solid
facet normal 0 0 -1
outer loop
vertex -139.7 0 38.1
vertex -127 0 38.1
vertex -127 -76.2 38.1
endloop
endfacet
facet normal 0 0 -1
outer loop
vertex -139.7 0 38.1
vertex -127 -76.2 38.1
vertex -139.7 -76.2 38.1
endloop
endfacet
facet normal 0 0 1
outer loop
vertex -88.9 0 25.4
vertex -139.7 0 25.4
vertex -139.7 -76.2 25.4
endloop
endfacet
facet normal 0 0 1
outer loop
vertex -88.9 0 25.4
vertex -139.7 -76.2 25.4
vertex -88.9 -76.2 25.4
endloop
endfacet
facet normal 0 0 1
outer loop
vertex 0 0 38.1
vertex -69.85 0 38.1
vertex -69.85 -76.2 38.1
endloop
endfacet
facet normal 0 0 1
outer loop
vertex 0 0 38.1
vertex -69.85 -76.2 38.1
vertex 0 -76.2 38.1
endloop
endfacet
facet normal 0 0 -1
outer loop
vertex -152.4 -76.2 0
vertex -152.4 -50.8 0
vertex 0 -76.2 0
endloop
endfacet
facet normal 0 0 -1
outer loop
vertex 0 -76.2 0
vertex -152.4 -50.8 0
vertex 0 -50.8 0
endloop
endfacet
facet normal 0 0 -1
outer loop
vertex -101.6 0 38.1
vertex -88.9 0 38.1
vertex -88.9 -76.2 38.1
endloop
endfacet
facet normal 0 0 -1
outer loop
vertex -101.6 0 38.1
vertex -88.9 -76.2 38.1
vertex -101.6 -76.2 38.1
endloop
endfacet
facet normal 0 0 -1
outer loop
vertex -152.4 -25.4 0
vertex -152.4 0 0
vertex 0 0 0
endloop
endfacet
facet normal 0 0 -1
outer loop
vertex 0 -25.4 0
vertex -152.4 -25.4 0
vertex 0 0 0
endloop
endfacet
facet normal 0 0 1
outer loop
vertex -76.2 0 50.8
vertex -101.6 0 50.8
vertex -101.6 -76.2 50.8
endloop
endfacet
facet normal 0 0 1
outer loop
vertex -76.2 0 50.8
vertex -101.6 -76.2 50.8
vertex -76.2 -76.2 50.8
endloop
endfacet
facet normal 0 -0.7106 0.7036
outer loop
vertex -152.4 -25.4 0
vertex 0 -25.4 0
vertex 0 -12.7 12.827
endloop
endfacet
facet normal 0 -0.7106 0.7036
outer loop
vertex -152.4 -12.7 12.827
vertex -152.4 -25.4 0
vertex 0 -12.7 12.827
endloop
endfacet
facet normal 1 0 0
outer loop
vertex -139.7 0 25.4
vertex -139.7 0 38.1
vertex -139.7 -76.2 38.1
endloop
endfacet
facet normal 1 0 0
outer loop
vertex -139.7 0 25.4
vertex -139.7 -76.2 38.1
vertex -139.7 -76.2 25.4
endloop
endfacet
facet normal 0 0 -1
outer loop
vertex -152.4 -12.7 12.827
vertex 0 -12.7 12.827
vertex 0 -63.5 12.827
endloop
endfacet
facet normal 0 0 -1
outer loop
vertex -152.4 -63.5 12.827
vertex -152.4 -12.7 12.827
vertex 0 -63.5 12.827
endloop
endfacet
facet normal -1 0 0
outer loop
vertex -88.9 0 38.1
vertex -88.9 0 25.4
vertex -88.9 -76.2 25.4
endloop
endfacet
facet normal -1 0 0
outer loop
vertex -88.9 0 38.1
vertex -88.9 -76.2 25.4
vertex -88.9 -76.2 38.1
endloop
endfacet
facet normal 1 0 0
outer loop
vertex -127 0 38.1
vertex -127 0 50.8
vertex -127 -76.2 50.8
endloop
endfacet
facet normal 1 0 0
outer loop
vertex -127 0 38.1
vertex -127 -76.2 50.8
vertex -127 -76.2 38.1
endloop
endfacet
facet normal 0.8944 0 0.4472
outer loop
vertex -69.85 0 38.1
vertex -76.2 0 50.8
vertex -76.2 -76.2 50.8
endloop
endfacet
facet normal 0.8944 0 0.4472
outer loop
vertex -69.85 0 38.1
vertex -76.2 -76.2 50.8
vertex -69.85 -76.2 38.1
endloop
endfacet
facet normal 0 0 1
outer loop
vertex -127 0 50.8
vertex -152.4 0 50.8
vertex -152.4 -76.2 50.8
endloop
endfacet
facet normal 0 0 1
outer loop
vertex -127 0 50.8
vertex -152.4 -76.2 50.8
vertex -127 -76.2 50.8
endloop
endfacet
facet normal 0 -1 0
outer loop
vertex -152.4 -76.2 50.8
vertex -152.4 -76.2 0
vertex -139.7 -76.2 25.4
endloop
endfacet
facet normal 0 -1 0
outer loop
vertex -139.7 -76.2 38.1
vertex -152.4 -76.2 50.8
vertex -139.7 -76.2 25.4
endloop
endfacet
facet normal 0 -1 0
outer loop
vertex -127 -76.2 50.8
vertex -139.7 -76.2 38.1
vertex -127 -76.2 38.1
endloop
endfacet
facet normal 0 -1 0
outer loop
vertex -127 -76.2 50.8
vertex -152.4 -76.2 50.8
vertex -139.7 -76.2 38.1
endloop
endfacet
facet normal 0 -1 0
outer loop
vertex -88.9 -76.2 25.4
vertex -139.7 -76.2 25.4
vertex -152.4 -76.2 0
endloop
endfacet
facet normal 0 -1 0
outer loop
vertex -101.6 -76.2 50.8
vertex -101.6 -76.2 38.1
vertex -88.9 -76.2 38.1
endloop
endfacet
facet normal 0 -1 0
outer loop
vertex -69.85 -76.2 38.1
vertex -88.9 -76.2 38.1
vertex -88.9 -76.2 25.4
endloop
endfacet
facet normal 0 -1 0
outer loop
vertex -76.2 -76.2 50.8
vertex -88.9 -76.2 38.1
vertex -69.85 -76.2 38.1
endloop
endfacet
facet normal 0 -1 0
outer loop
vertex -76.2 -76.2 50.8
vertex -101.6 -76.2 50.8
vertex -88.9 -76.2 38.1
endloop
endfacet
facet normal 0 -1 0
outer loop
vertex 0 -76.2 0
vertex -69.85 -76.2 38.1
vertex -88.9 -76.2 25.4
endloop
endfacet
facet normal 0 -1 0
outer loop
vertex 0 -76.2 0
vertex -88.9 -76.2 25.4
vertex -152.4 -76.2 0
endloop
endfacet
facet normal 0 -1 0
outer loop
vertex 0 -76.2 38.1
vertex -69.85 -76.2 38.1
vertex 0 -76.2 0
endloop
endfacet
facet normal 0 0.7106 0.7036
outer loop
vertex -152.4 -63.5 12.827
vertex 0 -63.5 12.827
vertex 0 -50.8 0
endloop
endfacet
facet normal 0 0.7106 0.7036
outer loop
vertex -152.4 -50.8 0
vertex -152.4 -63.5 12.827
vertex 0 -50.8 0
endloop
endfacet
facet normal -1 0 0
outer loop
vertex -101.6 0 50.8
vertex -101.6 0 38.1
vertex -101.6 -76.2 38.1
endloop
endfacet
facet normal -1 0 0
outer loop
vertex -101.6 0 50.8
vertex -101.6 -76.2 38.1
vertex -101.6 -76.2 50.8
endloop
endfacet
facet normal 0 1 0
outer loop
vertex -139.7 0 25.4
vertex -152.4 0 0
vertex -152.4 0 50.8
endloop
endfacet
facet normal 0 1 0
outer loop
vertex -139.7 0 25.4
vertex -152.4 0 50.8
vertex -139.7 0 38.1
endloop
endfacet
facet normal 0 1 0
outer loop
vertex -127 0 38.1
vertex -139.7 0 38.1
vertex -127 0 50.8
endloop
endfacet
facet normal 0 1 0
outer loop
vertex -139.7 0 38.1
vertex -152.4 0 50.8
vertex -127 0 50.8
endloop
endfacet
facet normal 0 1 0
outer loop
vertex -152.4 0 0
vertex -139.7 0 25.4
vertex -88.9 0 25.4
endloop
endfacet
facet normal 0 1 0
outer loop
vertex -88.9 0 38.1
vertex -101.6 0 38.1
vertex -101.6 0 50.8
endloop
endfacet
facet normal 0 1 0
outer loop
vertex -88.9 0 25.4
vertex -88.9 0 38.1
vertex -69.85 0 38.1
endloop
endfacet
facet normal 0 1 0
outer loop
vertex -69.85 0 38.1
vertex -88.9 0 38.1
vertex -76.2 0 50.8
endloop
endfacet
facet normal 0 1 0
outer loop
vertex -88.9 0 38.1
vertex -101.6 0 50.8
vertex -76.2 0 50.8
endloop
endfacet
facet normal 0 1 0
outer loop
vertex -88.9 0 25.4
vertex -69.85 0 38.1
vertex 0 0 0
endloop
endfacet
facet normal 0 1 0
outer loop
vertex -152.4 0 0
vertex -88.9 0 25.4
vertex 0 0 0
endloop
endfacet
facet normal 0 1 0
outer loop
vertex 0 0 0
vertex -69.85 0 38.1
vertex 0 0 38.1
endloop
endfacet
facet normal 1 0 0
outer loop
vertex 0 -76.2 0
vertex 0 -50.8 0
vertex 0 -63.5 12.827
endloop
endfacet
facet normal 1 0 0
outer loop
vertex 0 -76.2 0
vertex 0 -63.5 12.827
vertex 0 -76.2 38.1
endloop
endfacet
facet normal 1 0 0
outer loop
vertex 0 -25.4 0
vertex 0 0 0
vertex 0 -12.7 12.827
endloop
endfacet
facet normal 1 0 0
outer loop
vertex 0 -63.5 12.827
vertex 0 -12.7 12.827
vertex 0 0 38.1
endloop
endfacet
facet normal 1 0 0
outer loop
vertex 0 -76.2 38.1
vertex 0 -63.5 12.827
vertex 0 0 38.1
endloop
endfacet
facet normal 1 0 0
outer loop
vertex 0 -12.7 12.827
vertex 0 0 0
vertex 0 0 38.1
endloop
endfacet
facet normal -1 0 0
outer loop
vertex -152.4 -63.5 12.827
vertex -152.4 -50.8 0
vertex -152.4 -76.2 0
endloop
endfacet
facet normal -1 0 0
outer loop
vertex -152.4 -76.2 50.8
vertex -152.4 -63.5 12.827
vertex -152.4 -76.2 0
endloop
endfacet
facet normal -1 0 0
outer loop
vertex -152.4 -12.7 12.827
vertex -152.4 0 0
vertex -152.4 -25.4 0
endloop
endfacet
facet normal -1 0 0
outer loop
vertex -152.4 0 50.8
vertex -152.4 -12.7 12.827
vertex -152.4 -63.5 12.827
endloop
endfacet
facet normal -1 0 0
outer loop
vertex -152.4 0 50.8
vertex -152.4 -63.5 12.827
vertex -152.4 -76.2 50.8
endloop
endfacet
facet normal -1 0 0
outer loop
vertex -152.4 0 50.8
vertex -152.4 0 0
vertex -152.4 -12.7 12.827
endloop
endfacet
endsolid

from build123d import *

# Parameters (mm, degrees)
F0_W     = 152.4
F0_H     = 50.8
F1_DEPTH = 76.2
F3_DEPTH = 92.964
F5_DEPTH = 93.472
F7_DEPTH = 203.454


with BuildPart() as f1:
    # F0 (on Front) → F1 (new body)
    with BuildSketch(Plane.XZ):
        with Locations((-76.2, 25.4)):
            Rectangle(F0_W, F0_H)
    extrude(amount=F1_DEPTH)

    # F2 (on face) → F3 (cut)
    with BuildSketch(Plane.XZ.offset(76.2)):
        Polygon((-101.6, 50.8), (-127, 50.8), (-127, 38.1), (-139.7, 38.1), (-139.7, 25.4), (-88.9, 25.4), (-88.9, 38.1), (-101.6, 38.1), align=None)
    extrude(amount=-F3_DEPTH, mode=Mode.SUBTRACT)

    # F4 (on face) → F5 (cut)
    with BuildSketch(Plane.XZ.offset(76.2)):
        Polygon((0, 50.8), (-76.2, 50.8), (-69.85, 38.1), (0, 38.1), align=None)
    extrude(amount=-F5_DEPTH, mode=Mode.SUBTRACT)

    # F6 (on face) → F7 (cut)
    with BuildSketch(Plane.YZ):
        Polygon((-63.5, 12.827001), (-50.8, 0), (-25.4, 0), (-12.7, 12.827001), align=None)
    extrude(amount=-F7_DEPTH, mode=Mode.SUBTRACT)


solid = f1.part
